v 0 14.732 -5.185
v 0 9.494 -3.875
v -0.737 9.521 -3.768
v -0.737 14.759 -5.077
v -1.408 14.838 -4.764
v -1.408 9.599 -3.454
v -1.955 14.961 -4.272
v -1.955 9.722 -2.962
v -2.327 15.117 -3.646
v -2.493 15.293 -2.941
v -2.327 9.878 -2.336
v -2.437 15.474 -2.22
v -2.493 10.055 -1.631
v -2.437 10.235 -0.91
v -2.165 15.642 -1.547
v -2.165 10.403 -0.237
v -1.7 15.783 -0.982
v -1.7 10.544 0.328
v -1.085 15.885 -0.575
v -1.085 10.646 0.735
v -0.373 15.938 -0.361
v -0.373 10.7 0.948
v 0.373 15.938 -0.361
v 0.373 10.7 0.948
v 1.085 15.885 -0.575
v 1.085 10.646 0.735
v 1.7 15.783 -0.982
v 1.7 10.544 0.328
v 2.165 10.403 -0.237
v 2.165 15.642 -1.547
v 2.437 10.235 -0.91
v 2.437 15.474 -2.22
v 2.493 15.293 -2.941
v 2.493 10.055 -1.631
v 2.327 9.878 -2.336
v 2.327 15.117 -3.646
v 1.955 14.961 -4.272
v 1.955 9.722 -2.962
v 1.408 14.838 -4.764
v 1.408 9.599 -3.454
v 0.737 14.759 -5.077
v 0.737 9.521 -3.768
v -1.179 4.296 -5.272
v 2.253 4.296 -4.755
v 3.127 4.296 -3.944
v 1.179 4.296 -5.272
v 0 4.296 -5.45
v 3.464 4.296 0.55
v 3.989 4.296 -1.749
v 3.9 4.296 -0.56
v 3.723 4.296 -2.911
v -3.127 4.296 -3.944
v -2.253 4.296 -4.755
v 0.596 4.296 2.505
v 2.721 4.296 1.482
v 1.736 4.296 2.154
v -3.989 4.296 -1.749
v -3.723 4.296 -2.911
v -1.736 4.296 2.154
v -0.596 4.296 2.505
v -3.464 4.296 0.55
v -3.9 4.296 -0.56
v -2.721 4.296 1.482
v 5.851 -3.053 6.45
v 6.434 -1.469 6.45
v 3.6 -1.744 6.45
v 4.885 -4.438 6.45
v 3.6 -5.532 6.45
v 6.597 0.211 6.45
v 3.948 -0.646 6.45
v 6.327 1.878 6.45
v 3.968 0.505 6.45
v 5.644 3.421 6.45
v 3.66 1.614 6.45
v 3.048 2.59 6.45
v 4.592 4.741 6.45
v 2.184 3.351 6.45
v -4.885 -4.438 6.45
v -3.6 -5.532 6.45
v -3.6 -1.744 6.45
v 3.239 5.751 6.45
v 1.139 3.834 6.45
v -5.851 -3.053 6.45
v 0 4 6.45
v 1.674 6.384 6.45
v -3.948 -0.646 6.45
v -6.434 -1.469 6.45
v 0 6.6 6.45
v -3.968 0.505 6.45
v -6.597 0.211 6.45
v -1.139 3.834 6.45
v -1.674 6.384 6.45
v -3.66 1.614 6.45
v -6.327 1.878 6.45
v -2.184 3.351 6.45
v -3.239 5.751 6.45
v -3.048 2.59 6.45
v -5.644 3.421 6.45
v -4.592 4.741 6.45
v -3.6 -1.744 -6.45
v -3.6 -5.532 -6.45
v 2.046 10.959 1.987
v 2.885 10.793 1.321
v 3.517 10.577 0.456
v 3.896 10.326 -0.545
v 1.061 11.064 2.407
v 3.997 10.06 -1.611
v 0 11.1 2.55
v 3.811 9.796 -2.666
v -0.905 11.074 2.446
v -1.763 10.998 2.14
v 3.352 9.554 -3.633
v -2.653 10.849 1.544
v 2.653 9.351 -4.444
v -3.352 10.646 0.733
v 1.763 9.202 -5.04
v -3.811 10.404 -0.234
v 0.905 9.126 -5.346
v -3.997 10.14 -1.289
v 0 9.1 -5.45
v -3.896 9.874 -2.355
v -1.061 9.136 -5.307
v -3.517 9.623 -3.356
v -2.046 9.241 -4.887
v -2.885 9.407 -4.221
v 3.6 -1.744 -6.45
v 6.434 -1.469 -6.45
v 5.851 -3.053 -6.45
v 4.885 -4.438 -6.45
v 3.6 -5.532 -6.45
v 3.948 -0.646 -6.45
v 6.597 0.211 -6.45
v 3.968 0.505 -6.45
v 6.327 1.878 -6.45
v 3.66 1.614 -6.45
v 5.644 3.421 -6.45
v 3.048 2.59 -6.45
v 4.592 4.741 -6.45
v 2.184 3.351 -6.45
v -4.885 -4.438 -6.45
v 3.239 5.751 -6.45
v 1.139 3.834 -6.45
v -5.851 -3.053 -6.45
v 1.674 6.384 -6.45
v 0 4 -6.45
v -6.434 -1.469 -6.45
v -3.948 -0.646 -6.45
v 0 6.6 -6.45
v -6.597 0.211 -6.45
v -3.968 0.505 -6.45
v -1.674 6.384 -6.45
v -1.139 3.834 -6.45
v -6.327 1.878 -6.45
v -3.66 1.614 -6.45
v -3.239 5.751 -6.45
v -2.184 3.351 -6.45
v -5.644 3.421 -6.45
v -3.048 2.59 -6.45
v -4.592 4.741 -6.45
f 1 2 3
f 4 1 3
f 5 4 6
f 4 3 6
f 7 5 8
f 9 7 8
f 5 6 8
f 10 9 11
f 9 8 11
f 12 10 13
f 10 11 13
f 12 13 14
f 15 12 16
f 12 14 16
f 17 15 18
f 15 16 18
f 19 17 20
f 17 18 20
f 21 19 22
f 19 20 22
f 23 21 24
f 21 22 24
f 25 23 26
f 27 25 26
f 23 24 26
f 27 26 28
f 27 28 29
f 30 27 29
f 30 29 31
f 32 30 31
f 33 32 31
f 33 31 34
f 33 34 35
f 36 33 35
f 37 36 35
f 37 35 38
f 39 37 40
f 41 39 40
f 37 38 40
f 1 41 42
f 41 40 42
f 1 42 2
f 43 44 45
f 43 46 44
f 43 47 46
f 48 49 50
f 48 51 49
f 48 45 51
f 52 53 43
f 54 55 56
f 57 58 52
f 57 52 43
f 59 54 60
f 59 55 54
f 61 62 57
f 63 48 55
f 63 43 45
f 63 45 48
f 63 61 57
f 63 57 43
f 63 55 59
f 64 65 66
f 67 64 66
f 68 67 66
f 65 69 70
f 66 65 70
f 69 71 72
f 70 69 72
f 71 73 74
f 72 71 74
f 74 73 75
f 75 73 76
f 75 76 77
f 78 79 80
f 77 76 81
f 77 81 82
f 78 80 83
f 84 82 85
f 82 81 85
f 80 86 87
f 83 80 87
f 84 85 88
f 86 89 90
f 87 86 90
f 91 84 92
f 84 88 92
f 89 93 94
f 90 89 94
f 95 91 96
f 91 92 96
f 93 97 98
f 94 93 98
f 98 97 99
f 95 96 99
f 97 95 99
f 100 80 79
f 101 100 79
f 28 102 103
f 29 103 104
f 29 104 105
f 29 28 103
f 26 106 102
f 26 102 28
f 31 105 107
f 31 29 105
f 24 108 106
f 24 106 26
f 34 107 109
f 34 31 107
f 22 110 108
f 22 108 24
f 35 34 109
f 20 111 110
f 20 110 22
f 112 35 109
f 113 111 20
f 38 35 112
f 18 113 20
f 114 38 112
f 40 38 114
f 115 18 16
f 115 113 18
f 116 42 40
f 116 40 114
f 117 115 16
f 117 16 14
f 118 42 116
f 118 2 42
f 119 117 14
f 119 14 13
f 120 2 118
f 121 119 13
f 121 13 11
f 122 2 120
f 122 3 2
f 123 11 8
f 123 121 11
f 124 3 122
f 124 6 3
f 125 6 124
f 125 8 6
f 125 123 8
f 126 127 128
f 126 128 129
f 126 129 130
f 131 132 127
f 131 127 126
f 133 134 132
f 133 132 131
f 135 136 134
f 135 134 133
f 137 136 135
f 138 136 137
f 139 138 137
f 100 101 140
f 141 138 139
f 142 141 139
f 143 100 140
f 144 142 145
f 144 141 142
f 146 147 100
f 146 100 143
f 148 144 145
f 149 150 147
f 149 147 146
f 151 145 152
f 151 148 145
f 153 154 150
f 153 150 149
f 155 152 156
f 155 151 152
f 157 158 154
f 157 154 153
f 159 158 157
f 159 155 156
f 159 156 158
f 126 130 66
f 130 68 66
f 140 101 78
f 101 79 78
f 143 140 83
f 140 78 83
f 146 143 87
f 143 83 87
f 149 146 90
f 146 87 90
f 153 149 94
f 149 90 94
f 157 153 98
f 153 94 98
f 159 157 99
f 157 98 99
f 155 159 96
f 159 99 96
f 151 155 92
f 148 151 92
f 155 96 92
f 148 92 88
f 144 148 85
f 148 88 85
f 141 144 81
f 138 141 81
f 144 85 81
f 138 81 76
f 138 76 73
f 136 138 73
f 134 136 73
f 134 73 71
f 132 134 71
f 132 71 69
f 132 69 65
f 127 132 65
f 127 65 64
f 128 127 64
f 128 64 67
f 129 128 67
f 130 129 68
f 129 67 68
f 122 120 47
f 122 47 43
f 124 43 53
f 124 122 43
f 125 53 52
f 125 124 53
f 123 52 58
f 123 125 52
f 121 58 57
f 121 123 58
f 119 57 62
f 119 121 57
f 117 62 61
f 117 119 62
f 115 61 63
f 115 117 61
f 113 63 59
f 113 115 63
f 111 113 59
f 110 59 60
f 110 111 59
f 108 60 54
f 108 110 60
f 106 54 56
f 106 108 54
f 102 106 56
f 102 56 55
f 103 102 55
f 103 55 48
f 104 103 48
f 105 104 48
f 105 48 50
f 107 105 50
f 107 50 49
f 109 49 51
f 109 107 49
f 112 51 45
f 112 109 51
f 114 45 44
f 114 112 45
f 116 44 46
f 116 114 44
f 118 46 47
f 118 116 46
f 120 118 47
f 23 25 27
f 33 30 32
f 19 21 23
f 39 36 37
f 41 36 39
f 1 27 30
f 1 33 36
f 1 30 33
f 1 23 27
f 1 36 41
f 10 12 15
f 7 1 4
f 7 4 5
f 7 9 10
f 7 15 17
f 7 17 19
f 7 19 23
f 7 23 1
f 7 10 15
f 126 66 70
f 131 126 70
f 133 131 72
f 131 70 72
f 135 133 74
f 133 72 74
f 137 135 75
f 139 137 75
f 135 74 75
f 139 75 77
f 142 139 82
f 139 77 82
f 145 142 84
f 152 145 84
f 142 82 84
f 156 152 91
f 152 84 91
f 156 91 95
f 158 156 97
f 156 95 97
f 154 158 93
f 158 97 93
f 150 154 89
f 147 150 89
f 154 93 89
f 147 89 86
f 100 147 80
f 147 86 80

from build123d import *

# Parameters (mm, degrees)
SALIENTE_EXTRUIR1_DEPTH    = 6.45
CROQUIS4_W                 = 4
CROQUIS4_H                 = 6.803555247
CORTAR_EXTRUIR1_DEPTH      = 15.435113439
CORTAR_EXTRUIR1_DEPTH_BACK = 15.435113439
CROQUIS6_R                 = 2.5
SALIENTE_EXTRUIR2_DEPTH    = 5.4


with BuildPart() as part:
    # Croquis3 → Saliente-Extruir1 (new, symmetric)
    with BuildSketch(Plane.XY):
        with BuildLine():
            Line((-3.6, -1.743559577), (-3.6, -5.531726674))
            ThreePointArc((-3.6, -5.531726674), (0, 6.6), (3.6, -5.531726674))
            Line((3.6, -5.531726674), (3.6, -1.743559577))
            ThreePointArc((3.6, -1.743559577), (0, 4), (-3.6, -1.743559577))
        make_face()
    extrude(amount=SALIENTE_EXTRUIR1_DEPTH, both=True)


with BuildPart() as body_2:
    # Croquis4 → Revolución5 (revolve)
    with BuildSketch(Plane(origin=(0, 0, 0), x_dir=(0, 0, -1), z_dir=(1, 0, 0))):
        with Locations((3.45, 7.698222377)):
            Rectangle(CROQUIS4_W, CROQUIS4_H)
    revolve(axis=Axis((0, 4.296444753, -1.45), (0, 1, 0)))

    # Croquis5 → Cortar-Extruir1 (cut, two sides: drawn at the far end of the back side and taken through both)
    with BuildSketch(Plane(origin=(0, 0, 0), x_dir=(0, 0, -1), z_dir=(1, 0, 0)).offset(-CORTAR_EXTRUIR1_DEPTH_BACK)):
        Polygon((-2.55, 11.1), (5.45, 9.1), (5.45, 11.1), align=None)
    extrude(amount=CORTAR_EXTRUIR1_DEPTH + CORTAR_EXTRUIR1_DEPTH_BACK, mode=Mode.SUBTRACT)

    # Croquis6 → Saliente-Extruir2 (add)
    with BuildSketch(Plane(origin=(0, 9.847058824, -2.461764706), x_dir=(1, 0, 0), z_dir=(0, 0.9701425001453319, -0.24253562503633297))):
        with Locations(Location((0, -1.042903188, 0), (0, 0, 90))):
            Circle(CROQUIS6_R)
    extrude(amount=SALIENTE_EXTRUIR2_DEPTH)


solid = Compound([part.part, body_2.part])
